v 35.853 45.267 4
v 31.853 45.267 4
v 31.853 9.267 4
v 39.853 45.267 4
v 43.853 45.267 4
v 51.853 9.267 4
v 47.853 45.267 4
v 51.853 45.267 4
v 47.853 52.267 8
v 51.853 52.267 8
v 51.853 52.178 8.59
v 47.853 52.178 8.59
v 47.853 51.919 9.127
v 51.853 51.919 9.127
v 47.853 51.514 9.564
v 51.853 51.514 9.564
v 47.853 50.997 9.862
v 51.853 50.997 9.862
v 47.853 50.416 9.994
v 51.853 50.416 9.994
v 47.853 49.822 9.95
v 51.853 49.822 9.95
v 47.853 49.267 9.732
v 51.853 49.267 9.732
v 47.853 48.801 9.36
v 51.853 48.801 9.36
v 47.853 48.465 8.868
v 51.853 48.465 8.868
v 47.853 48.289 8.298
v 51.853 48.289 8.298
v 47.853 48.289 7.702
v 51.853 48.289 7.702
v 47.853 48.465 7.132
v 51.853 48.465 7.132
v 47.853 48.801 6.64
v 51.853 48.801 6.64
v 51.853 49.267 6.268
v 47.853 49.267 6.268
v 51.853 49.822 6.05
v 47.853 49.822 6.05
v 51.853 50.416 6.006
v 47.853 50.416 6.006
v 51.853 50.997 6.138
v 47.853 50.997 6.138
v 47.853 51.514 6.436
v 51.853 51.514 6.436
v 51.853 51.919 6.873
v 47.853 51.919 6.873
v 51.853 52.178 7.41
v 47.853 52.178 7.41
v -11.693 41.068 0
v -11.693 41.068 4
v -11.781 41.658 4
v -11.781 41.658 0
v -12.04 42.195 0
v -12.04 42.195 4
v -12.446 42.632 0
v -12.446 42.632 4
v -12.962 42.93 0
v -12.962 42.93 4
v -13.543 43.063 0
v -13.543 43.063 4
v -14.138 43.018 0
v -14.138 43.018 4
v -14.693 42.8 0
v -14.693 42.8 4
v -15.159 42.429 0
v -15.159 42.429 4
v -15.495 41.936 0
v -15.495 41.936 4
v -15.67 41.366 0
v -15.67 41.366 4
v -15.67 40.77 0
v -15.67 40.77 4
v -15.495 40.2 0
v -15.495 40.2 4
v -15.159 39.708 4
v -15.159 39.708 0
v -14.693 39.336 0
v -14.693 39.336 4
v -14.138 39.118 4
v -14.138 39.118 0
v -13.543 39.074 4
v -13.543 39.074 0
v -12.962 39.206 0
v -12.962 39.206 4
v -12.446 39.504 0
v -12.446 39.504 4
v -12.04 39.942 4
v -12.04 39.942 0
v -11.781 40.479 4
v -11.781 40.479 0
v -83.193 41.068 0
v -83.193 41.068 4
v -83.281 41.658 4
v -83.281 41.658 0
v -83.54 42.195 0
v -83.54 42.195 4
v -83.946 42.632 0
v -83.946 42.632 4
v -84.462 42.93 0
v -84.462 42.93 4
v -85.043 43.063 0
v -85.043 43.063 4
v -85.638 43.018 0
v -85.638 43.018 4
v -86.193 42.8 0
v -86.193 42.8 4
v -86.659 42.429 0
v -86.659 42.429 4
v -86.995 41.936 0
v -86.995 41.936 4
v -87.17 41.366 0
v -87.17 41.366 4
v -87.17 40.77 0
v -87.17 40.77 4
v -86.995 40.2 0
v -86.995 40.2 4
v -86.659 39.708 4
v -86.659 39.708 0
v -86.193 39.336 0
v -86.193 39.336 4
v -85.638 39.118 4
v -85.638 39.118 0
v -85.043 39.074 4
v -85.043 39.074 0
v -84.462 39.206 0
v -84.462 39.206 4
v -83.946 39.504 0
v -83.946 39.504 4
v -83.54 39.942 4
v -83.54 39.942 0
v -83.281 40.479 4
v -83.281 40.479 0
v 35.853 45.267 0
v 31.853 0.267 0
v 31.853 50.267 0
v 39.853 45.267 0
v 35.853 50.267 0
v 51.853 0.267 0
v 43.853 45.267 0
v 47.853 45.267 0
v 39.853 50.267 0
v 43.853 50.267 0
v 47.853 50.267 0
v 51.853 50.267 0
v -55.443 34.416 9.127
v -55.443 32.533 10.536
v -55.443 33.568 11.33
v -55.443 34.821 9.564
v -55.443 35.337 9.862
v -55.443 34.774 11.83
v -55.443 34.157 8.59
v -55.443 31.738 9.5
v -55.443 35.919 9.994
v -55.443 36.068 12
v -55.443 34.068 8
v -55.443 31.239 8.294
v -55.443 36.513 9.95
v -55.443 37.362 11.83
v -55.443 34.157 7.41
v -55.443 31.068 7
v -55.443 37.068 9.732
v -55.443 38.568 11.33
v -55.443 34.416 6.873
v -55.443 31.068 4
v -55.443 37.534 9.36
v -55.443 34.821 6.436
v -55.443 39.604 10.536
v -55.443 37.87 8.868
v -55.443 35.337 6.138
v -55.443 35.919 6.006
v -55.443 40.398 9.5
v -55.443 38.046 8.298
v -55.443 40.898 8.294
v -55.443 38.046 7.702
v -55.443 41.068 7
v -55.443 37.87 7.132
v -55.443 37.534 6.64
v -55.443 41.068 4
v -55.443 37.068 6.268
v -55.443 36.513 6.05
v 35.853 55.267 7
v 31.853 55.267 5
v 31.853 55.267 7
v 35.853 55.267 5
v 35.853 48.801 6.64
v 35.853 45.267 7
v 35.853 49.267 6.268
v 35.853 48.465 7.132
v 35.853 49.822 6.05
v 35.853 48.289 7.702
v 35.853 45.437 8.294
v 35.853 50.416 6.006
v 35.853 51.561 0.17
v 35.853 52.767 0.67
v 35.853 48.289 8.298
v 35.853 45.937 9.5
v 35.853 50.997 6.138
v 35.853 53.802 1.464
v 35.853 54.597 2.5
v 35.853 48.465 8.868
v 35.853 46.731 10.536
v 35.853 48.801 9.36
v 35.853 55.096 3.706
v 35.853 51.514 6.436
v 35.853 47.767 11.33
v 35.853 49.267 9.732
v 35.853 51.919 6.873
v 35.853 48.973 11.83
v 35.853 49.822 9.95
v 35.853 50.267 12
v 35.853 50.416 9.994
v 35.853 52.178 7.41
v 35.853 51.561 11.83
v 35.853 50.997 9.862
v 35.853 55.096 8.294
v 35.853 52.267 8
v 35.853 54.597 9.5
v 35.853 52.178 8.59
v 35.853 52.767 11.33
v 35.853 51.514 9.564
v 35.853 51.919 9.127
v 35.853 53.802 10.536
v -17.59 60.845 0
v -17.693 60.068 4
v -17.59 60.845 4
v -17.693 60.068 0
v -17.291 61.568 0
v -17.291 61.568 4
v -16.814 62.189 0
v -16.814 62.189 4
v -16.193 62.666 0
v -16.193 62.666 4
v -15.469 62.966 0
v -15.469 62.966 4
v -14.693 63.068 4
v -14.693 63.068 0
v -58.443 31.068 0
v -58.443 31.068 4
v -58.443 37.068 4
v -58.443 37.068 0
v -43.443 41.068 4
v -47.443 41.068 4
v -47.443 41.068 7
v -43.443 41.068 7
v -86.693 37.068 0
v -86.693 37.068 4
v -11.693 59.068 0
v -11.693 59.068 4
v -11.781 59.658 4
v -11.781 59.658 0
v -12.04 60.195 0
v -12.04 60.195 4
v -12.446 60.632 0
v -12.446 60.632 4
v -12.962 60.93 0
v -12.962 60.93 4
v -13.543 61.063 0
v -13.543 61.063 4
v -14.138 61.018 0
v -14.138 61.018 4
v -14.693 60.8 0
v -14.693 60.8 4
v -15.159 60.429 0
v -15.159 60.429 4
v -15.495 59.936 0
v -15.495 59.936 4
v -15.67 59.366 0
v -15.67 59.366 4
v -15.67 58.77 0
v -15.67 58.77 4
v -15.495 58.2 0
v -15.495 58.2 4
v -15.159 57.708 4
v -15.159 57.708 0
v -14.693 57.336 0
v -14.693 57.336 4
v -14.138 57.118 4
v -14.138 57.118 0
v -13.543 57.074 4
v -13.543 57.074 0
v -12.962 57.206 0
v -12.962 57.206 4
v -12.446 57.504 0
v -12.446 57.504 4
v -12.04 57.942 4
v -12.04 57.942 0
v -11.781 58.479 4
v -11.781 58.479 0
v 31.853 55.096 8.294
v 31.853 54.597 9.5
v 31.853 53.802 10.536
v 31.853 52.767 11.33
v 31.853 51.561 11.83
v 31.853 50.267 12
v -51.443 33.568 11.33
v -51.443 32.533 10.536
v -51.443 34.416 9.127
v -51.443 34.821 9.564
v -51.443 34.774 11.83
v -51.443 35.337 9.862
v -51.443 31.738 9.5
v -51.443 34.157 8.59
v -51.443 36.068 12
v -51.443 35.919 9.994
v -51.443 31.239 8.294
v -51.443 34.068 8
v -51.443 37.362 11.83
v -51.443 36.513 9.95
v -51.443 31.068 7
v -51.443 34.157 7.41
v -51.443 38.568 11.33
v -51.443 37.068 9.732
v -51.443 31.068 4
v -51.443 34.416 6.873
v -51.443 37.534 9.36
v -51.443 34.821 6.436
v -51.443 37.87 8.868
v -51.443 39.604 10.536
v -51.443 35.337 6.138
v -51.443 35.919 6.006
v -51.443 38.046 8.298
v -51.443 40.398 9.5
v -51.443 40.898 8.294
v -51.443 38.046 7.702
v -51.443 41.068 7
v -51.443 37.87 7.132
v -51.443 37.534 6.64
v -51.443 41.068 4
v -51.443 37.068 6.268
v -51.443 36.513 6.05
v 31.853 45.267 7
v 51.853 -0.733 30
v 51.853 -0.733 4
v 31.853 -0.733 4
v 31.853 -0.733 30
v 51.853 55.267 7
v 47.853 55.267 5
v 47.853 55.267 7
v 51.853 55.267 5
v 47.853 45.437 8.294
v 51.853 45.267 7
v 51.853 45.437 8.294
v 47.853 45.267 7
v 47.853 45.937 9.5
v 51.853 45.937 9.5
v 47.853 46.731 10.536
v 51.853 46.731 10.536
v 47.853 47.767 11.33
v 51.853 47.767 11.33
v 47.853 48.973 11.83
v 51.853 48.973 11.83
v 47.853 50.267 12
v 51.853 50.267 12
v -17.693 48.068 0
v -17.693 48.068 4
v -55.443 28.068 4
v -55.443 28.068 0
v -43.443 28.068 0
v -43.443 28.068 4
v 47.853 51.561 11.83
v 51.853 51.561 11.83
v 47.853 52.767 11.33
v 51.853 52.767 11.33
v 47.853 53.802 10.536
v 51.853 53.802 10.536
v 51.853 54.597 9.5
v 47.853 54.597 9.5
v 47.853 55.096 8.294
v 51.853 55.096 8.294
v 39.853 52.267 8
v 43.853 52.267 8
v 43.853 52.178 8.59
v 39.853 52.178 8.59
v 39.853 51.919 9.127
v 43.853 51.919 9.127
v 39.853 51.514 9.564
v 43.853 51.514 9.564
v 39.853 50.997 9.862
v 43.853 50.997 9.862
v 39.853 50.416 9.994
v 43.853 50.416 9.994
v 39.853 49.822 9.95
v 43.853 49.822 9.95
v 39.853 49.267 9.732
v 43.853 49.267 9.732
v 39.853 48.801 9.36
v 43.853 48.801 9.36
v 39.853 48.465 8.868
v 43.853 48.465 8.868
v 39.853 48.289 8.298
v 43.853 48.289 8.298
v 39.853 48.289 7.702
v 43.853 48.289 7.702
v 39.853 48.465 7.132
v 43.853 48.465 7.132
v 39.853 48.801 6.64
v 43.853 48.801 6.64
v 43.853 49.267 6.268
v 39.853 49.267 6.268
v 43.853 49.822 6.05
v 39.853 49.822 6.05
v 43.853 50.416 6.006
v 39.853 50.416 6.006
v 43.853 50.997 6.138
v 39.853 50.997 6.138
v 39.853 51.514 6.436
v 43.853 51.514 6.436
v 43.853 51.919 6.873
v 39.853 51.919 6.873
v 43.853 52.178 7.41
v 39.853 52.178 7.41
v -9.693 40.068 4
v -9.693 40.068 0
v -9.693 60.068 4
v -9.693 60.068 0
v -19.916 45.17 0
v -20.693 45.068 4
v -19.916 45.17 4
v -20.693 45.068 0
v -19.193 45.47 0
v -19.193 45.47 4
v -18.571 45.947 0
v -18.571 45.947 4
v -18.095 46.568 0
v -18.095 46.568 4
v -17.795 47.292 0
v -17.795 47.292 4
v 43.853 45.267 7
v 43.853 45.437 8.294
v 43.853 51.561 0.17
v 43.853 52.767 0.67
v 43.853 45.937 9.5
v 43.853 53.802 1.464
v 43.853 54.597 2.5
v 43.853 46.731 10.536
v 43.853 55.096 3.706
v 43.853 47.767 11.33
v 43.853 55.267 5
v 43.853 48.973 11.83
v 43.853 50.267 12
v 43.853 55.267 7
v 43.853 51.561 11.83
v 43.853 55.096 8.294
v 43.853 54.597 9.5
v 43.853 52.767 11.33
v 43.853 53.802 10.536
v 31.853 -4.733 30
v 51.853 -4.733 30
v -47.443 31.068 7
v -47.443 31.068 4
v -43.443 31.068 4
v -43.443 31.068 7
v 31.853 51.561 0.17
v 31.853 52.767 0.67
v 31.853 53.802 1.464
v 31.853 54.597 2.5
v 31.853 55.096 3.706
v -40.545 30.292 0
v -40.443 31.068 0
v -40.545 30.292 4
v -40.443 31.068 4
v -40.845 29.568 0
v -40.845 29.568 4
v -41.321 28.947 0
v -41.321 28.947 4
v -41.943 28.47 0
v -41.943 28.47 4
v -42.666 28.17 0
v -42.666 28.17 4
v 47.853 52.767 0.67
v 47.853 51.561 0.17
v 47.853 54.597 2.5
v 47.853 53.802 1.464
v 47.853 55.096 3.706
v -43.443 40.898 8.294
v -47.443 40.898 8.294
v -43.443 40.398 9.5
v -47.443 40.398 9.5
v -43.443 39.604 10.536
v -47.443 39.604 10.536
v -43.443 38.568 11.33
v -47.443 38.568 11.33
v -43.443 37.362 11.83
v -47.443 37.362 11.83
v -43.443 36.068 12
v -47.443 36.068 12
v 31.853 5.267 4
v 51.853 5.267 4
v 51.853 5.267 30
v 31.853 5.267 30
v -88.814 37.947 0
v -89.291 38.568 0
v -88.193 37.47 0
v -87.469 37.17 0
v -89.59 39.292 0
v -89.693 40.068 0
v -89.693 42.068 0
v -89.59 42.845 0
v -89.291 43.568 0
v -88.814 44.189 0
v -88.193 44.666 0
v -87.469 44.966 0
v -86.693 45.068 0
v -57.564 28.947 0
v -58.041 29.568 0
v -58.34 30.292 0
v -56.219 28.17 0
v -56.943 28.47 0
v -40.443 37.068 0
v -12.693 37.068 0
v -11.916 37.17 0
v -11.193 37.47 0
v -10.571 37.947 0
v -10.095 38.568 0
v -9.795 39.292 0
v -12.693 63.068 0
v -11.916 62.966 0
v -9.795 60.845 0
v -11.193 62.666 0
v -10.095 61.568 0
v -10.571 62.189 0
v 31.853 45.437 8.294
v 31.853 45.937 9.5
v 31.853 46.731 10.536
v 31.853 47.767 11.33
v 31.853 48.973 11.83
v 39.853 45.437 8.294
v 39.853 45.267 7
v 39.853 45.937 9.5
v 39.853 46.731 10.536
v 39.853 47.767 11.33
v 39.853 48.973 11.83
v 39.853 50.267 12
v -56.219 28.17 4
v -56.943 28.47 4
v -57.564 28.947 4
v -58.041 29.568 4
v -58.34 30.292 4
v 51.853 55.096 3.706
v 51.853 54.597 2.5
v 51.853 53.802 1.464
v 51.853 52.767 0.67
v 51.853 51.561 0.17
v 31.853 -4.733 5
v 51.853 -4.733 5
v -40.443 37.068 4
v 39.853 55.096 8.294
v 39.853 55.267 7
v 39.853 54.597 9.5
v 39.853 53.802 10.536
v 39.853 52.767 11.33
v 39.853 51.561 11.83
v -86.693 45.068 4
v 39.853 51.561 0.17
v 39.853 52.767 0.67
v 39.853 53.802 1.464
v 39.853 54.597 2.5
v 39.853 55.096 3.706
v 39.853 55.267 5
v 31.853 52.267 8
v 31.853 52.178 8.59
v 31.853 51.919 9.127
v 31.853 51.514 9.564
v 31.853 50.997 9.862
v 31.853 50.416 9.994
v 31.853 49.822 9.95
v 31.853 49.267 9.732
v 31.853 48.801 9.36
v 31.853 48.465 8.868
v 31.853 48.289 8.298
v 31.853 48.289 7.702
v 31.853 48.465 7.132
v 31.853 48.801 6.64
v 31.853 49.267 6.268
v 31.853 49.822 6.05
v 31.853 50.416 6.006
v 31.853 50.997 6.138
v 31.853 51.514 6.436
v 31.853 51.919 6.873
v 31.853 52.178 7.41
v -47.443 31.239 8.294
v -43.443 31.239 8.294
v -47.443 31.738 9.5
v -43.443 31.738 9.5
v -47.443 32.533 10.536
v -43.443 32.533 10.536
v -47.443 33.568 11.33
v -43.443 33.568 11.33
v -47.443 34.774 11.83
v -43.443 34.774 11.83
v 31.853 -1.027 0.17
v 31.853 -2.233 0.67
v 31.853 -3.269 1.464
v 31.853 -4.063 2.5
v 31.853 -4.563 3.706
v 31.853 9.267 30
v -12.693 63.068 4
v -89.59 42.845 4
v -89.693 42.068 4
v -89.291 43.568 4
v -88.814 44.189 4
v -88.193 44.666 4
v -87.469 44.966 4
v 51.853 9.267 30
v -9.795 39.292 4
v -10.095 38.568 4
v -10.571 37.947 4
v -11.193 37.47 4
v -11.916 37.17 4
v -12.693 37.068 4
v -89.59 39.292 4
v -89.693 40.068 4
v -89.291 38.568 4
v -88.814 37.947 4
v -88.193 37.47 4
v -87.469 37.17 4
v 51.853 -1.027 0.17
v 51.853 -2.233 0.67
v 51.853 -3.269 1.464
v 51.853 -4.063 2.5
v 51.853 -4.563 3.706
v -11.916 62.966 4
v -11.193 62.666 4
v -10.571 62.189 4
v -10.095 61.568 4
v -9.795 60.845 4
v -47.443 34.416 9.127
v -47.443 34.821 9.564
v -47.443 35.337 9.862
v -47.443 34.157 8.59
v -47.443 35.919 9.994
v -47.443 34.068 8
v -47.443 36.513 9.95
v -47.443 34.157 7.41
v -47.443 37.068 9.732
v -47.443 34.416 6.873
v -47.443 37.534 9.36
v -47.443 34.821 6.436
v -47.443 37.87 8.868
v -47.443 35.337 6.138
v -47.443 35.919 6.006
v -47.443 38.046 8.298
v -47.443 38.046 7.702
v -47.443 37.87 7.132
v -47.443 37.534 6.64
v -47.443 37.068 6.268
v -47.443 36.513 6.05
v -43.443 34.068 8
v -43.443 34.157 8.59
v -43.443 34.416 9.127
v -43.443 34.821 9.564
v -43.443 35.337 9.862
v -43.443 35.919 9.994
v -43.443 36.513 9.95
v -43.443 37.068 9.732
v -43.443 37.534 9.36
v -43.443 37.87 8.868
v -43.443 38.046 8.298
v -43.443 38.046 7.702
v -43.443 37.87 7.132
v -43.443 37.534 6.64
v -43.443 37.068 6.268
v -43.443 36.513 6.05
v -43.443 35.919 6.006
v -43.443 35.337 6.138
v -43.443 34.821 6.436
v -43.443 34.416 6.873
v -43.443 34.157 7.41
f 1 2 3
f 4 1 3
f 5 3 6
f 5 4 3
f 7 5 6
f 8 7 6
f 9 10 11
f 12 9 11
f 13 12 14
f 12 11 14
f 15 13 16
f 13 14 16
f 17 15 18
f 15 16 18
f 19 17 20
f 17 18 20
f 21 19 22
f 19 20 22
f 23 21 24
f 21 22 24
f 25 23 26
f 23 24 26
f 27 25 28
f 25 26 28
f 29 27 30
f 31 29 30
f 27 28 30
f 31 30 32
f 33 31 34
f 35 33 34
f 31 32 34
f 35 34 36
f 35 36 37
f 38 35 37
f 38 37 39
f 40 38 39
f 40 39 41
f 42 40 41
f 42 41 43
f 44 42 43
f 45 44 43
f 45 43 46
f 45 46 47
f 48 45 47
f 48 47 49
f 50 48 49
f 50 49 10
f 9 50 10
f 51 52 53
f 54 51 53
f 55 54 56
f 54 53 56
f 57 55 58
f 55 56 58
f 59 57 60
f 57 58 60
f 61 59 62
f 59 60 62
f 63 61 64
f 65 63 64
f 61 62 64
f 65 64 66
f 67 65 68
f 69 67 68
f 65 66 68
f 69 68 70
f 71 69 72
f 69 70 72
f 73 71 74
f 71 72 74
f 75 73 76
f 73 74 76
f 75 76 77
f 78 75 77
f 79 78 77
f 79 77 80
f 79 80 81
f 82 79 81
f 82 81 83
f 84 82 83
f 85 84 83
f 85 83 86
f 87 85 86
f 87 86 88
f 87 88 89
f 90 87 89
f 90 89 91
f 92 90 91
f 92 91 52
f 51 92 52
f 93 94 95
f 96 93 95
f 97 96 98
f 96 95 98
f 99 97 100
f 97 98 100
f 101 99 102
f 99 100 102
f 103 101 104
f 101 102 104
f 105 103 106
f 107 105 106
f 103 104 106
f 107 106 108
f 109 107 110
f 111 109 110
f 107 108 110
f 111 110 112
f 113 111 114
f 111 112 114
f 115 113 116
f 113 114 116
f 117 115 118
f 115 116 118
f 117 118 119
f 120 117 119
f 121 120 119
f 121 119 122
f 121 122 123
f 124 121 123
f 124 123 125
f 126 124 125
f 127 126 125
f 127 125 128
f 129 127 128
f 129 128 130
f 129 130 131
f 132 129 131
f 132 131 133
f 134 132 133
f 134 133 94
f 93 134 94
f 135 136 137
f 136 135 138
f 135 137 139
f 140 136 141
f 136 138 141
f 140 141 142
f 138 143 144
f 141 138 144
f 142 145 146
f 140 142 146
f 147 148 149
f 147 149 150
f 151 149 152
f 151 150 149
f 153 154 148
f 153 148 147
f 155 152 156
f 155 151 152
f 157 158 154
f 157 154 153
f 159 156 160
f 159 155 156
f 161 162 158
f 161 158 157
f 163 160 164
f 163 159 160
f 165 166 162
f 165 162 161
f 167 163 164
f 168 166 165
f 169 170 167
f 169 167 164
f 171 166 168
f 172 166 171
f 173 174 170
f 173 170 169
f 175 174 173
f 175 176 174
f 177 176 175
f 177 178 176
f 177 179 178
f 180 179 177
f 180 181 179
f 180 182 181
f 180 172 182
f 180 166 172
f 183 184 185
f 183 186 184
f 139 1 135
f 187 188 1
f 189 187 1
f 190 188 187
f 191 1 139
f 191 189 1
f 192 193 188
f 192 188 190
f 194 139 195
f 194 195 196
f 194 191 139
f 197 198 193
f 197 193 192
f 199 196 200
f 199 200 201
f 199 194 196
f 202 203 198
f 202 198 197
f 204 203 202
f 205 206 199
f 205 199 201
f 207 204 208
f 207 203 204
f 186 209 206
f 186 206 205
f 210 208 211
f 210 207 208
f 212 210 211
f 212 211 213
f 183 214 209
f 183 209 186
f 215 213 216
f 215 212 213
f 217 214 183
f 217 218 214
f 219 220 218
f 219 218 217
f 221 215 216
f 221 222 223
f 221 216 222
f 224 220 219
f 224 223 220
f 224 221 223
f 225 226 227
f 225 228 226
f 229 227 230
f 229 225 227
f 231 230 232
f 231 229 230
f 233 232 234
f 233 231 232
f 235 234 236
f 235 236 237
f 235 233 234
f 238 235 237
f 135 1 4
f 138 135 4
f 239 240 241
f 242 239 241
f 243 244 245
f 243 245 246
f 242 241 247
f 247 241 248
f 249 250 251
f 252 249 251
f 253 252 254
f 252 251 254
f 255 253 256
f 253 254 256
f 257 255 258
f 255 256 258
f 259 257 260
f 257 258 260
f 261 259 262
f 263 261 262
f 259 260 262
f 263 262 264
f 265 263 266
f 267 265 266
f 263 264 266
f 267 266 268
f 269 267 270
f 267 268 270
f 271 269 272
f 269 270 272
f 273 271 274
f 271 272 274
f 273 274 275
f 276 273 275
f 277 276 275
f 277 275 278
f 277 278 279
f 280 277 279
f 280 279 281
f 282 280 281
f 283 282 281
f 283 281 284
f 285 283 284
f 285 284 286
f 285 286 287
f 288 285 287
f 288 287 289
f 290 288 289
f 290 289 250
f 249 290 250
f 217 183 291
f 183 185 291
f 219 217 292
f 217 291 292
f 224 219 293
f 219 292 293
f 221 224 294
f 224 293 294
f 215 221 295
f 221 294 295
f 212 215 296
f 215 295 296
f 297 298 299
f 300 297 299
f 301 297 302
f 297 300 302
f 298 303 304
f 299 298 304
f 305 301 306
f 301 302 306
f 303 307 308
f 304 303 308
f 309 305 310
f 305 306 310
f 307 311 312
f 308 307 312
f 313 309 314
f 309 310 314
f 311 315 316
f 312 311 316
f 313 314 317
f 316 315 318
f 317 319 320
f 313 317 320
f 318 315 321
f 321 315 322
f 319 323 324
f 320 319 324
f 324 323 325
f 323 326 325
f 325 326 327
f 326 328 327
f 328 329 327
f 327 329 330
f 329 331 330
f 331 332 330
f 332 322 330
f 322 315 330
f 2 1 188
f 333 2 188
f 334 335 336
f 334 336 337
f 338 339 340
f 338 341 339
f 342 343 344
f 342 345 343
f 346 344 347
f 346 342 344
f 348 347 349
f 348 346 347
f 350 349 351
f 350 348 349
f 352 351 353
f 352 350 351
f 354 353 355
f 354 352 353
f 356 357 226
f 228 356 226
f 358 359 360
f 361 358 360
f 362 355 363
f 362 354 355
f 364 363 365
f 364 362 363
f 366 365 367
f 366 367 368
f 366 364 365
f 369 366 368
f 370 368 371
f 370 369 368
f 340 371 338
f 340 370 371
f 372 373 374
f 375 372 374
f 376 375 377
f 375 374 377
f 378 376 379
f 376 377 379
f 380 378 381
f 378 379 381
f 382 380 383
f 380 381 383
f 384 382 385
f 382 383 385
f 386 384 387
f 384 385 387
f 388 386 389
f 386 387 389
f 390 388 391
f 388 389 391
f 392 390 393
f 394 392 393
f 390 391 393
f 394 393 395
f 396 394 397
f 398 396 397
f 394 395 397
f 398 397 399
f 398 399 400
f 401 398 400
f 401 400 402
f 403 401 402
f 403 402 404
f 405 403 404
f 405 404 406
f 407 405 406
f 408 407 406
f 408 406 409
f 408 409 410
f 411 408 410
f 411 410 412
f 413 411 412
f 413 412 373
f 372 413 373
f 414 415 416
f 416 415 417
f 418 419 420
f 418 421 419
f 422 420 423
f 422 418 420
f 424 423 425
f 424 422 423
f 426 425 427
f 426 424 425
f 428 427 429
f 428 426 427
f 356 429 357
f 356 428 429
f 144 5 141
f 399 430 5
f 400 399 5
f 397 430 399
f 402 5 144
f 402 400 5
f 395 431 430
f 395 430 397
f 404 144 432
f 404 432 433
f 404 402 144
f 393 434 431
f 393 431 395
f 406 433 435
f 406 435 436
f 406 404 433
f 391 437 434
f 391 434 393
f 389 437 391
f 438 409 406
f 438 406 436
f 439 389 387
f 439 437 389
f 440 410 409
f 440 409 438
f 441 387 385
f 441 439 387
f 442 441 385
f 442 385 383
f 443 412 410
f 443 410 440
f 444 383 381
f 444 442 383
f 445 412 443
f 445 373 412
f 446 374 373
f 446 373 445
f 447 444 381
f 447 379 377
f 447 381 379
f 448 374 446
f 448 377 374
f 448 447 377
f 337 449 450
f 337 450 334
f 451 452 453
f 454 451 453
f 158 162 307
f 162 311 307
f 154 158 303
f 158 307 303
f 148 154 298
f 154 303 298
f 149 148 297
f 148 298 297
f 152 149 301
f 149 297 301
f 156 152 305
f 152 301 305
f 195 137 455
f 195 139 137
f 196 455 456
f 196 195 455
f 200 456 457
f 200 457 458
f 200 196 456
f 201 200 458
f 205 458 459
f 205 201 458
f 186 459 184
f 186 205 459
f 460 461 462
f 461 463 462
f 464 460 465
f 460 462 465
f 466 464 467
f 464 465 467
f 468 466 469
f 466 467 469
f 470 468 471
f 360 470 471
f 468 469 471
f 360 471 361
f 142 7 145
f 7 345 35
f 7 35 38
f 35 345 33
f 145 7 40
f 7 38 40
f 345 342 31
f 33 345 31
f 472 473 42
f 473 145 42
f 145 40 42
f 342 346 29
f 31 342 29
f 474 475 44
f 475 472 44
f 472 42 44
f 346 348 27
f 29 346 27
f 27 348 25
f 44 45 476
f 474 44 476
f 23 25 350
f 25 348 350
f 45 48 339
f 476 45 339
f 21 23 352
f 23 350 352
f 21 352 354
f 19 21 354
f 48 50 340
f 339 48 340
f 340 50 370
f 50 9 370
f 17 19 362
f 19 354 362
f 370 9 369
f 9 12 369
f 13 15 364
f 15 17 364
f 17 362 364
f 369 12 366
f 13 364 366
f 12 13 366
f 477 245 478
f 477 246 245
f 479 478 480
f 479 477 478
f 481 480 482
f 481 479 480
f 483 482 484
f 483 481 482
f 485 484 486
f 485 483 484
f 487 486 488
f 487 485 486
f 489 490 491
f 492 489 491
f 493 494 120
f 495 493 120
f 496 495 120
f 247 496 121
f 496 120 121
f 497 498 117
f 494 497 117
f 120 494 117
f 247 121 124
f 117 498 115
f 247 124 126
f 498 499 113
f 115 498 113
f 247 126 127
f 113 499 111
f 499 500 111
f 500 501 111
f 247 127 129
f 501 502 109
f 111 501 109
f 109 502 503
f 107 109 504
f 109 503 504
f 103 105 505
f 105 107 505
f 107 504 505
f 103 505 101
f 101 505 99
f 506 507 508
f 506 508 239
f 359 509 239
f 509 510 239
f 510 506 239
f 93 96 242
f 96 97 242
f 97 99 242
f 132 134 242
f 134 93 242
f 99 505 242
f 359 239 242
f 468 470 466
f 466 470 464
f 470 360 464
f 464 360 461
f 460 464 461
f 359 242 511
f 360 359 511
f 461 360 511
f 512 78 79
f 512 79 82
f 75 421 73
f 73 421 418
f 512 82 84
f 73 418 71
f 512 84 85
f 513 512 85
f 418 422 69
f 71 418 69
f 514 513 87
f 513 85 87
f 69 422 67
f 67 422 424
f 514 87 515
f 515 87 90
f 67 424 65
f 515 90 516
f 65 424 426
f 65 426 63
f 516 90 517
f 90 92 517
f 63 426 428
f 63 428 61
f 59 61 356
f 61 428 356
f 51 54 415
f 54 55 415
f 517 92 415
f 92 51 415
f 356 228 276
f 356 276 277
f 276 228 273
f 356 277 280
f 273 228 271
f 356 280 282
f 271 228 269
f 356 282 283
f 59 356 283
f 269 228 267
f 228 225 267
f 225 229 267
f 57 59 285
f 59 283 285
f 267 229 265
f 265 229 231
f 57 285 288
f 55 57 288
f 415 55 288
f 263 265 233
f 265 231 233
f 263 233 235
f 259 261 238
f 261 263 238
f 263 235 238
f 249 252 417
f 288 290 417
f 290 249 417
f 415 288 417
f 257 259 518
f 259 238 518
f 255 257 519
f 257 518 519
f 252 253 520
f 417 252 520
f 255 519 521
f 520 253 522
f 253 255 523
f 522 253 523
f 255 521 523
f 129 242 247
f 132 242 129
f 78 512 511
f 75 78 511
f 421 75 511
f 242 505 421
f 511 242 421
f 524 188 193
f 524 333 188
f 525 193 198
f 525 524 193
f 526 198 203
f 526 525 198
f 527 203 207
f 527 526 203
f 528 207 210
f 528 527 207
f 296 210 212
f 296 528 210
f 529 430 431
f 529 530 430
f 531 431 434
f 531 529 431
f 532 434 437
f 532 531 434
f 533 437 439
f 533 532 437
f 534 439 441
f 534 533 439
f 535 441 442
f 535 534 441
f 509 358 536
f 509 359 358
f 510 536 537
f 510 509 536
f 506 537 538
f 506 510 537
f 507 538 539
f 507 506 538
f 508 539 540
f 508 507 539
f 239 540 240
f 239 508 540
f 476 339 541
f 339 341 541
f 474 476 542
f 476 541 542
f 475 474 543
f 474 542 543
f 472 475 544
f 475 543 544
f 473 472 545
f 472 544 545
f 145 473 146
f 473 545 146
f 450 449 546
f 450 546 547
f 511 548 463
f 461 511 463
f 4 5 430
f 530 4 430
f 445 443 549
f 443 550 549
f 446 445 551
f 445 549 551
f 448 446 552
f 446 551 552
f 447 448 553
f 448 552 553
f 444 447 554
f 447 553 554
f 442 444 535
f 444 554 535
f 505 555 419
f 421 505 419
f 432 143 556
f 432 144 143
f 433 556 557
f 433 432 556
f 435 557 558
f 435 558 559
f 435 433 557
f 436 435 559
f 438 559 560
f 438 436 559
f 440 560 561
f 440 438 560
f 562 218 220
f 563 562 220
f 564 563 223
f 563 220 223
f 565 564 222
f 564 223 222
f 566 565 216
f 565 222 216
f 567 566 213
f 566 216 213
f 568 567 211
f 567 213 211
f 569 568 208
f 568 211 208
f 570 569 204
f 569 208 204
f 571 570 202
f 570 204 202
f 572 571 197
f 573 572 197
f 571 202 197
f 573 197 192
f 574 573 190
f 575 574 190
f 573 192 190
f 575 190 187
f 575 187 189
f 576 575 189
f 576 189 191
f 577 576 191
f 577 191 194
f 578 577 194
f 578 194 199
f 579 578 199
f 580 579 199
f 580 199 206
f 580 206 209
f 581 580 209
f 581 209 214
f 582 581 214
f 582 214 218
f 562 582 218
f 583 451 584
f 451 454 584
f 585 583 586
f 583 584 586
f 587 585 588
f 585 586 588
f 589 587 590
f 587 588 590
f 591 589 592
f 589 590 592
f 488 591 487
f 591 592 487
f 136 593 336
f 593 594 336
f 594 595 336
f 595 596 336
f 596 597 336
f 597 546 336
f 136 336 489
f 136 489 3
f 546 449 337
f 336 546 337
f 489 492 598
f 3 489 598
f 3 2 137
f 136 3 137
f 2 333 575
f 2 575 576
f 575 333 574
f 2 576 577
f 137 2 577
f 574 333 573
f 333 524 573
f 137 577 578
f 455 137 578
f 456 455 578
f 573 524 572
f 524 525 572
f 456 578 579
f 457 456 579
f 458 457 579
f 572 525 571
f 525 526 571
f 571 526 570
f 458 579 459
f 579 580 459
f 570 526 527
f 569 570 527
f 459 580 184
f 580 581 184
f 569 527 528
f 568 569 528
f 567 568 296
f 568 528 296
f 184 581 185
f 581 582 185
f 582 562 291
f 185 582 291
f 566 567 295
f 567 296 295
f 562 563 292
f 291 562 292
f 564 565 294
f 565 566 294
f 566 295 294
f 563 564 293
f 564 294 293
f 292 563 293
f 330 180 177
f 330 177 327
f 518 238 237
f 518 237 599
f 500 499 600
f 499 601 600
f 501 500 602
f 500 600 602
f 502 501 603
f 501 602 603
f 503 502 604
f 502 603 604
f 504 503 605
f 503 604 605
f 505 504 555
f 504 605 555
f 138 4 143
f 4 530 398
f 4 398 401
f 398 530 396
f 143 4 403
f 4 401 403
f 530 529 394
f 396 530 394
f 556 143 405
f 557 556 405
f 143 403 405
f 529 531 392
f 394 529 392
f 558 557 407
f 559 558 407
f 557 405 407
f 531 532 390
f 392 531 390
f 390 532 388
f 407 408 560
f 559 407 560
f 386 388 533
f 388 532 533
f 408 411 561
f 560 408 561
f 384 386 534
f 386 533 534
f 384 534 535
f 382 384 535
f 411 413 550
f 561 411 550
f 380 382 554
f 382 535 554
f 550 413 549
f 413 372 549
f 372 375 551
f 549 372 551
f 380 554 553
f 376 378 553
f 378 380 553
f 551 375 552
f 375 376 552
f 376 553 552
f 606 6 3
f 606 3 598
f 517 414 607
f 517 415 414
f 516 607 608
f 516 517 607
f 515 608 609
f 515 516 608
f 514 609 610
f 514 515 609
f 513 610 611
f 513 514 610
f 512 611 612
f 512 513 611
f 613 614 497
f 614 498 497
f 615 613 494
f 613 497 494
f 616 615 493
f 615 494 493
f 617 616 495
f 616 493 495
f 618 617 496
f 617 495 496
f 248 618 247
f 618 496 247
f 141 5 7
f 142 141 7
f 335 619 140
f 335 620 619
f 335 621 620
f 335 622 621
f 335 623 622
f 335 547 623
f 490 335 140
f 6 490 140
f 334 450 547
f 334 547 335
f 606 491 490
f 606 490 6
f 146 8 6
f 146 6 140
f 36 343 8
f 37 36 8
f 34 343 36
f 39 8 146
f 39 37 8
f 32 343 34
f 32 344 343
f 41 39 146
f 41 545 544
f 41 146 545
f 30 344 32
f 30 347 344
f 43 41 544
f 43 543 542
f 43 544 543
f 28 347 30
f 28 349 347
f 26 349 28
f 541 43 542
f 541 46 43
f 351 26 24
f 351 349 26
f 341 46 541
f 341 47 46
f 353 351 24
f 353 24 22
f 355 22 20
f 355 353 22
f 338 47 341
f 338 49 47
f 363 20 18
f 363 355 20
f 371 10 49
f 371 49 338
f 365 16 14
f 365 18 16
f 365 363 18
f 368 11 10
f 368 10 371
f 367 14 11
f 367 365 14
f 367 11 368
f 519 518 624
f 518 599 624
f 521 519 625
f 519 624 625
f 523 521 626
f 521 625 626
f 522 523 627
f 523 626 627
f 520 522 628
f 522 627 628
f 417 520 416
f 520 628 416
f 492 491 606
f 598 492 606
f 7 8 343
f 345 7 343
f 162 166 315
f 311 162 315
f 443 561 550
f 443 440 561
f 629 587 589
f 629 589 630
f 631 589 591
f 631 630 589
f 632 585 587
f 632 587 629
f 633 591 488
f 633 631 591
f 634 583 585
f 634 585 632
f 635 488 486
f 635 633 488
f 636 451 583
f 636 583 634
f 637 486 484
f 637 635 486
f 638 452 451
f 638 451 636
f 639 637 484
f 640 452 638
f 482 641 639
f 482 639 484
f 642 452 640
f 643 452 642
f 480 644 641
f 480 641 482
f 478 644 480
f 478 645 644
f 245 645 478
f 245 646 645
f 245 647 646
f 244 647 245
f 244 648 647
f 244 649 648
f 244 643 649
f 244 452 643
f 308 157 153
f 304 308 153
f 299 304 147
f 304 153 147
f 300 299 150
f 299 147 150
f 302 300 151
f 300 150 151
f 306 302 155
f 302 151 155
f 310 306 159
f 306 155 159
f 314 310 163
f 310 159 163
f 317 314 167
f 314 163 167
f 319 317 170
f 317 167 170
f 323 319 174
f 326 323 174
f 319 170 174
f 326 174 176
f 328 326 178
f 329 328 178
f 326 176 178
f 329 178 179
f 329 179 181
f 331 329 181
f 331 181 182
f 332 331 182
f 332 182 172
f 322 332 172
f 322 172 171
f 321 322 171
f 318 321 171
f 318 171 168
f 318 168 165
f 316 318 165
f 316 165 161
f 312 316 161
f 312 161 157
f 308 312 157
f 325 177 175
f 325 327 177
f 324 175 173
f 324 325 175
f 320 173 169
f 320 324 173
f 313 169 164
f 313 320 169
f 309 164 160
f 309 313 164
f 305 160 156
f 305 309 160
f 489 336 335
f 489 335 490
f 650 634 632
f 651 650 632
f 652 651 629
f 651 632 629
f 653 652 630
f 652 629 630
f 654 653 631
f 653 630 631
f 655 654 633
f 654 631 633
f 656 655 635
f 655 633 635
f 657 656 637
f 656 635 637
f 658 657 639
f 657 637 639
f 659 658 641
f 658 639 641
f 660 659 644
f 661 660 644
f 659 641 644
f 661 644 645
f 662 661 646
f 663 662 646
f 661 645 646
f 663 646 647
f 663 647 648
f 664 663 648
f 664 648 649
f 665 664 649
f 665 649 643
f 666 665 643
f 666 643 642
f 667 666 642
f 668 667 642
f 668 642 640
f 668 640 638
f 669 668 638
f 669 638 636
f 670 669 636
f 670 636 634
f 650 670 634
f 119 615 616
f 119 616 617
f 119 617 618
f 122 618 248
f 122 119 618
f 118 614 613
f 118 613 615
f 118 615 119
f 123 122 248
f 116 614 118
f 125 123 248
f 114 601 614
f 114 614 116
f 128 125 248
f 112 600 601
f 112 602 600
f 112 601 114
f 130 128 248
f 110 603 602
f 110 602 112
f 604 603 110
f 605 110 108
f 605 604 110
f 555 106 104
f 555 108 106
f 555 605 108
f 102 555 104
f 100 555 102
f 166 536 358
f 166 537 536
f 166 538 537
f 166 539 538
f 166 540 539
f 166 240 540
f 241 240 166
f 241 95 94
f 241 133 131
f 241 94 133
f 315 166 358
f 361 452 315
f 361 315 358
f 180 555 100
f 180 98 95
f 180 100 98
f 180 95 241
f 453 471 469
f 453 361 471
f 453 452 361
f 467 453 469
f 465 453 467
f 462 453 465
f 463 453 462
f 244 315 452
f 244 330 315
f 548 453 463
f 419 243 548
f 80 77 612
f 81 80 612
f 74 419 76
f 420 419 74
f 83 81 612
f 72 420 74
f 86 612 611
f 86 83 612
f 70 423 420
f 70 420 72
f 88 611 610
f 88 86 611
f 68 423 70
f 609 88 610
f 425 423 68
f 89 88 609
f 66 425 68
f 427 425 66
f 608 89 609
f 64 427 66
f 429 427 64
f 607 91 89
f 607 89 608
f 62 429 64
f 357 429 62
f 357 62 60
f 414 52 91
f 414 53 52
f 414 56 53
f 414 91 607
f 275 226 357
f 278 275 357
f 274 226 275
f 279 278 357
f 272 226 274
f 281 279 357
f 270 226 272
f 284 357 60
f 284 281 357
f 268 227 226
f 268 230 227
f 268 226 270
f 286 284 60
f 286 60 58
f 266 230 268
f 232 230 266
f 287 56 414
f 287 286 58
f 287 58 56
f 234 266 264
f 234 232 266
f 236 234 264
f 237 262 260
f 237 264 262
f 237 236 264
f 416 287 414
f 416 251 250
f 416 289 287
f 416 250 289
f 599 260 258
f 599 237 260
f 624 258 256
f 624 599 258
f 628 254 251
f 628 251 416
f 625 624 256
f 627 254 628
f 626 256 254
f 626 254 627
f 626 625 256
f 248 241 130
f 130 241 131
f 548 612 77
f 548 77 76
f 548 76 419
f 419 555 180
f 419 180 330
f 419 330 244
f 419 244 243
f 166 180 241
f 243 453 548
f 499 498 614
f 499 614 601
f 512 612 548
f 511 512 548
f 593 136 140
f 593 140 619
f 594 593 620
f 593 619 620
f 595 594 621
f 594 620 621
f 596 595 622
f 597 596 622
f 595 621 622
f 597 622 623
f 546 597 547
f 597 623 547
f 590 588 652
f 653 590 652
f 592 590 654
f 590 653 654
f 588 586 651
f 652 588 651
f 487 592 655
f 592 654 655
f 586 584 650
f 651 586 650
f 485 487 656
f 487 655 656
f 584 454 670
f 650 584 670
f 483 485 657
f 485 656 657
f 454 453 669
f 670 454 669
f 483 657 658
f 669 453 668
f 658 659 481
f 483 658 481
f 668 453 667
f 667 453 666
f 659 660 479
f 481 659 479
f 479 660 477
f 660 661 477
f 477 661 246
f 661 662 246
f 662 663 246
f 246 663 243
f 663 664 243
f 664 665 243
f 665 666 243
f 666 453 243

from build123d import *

# Parameters (mm, degrees)
F0_W      = 80
F0_H      = 35
F1_DEPTH  = 4
F2_R      = 2
F2_W      = 78.2012213022
F2_H      = 24.0091495216
F3_DEPTH  = 25
F4_W      = 4
F4_H      = 10
F5_DEPTH  = 8
F6_R      = 2
F7_DEPTH  = 12
F8_R      = 4.99999
F9_W      = 30.75
F9_H      = 9
F9_W_2    = 31.25
F10_DEPTH = 25
F11_R     = 3
F12_W     = 20
F12_H     = 60
F13_DEPTH = 4
F14_W     = 10
F14_H     = 8
F14_W_2   = 14
F14_H_2   = 26
F15_DEPTH = 20
F16_R     = 2
F16_W     = 6
F16_H     = 26
F17_DEPTH = 20
F18_W     = 4
F18_H     = 10
F19_DEPTH = 12
F20_R     = 4.99999


# Not quite as in the source:
# - a fillet or chamfer is up to 0.001 mm smaller than in the source, because OpenCascade refuses the exact size


with BuildPart() as f1:
    # F0 (on Top) → F1 (new body)
    with BuildSketch(Plane.XY):
        with Locations((-49.6926223859, 45.5681574084)):
            Rectangle(F0_W, F0_H)
    extrude(amount=F1_DEPTH)

    # F2 (on face) → F3 (cut)
    with BuildSketch(Plane.XY.offset(4)):
        with Locations((-85.1926223859, 41.0681574084)):
            Circle(F2_R)
        with Locations((-13.6926223859, 41.0681574084)):
            Circle(F2_R)
        with Locations((-13.6926223859, 59.0681574084)):
            Circle(F2_R)
        with Locations((-56.793233037, 57.0727321692)):
            Rectangle(F2_W, F2_H)
    extrude(amount=-F3_DEPTH, mode=Mode.SUBTRACT)

    # F4 (on face) → F5 (join)
    with BuildSketch(Plane.XY.offset(4)):
        with Locations((-53.4426223859, 36.0681574084)):
            Rectangle(F4_W, F4_H)
        with Locations((-45.4426223859, 36.0681574084)):
            Rectangle(F4_W, F4_H)
    extrude(amount=F5_DEPTH)

    # F6 (on face) → F7 (cut)
    with BuildSketch(Plane(origin=(-55.4426223859, 0, 0), x_dir=(0, -1, 0), z_dir=(-1, 0, 0))):
        with Locations((-36.0681574084, 8)):
            Circle(F6_R)
    extrude(amount=-F7_DEPTH, mode=Mode.SUBTRACT)

    # F8 (radius 5 in the source; OpenCascade refuses exactly that, so slightly less here)
    f8_edges = [f1.edges().sort_by_distance(p)[0] for p in [
        (-53.442622, 41.068157, 12),
        (-45.442622, 41.068157, 12),
        (-53.442622, 31.068157, 12),
        (-45.442622, 31.068157, 12),
    ]]
    fillet(f8_edges, radius=F8_R)

    # F9 (on face) → F10 (cut)
    with BuildSketch(Plane.XY.offset(4)):
        Polygon((-89.6926223859, 37.0681574084), (-102.8804979962, 37.0681574084), (-102.8804979962, 18.9452479413), (-58.4426223859, 18.9452479413), (-58.4426223859, 28.0681574084), (-89.6926223859, 28.0681574084), align=None)
        Polygon((-9.6926223859, 28.0681574084), (-40.4426223859, 28.0681574084), (-40.4426223859, 16.9630516109), (3.4488050875, 16.9630516109), (3.4488050875, 37.0681574084), (-9.6926223859, 37.0681574084), align=None)
        with Locations((-25.0676223859, 32.5681574084)):
            Rectangle(F9_W, F9_H)
        with Locations((-74.0676223859, 32.5681574084)):
            Rectangle(F9_W_2, F9_H)
    extrude(amount=-F10_DEPTH, mode=Mode.SUBTRACT)

    # F11
    f11_edges = [f1.edges().sort_by_distance(p)[0] for p in [
        (-89.692622, 45.068157, 2),
        (-89.692622, 37.068157, 2),
        (-58.442622, 28.068157, 2),
        (-40.442622, 28.068157, 2),
        (-9.692622, 37.068157, 2),
        (-9.692622, 63.068157, 2),
        (-17.692622, 63.068157, 2),
        (-17.692622, 45.068157, 2),
    ]]
    fillet(f11_edges, radius=F11_R)


with BuildPart() as f13:
    # F12 (on Top) → F13 (new body)
    with BuildSketch(Plane.XY):
        with Locations((41.8533885479, 25.26676815)):
            Rectangle(F12_W, F12_H)
    extrude(amount=F13_DEPTH)

    # F14 (on face) → F15 (join)
    with BuildSketch(Plane.YZ.offset(51.8533885479)):
        with Locations((50.26676815, 8)):
            Rectangle(F14_W, F14_H)
        with Locations((2.26676815, 17)):
            Rectangle(F14_W_2, F14_H_2)
    extrude(amount=-F15_DEPTH)

    # F16 (on face) → F17 (cut)
    with BuildSketch(Plane.YZ.offset(51.8533885479)):
        with Locations((50.26676815, 8)):
            Circle(F16_R)
        with Locations((2.26676815, 17)):
            Rectangle(F16_W, F16_H)
    extrude(amount=-F17_DEPTH, mode=Mode.SUBTRACT)

    # F18 (on face) → F19 (cut)
    with BuildSketch(Plane.XY.offset(12)):
        with Locations((37.8533885479, 50.26676815)):
            Rectangle(F18_W, F18_H)
        with Locations((45.8533885479, 50.26676815)):
            Rectangle(F18_W, F18_H)
    extrude(amount=-F19_DEPTH, mode=Mode.SUBTRACT)

    # F20 (radius 5 in the source; OpenCascade refuses exactly that, so slightly less here)
    f20_edges = [f13.edges().sort_by_distance(p)[0] for p in [
        (41.853389, -4.733232, 0),
        (49.853389, 45.266768, 12),
        (49.853389, 55.266768, 12),
        (41.853389, 45.266768, 12),
        (41.853389, 55.266768, 12),
        (33.853389, 45.266768, 12),
        (33.853389, 55.266768, 12),
        (49.853389, 55.266768, 0),
        (41.853389, 55.266768, 0),
        (33.853389, 55.266768, 0),
    ]]
    fillet(f20_edges, radius=F20_R)


solid = Compound([f1.part, f13.part])
